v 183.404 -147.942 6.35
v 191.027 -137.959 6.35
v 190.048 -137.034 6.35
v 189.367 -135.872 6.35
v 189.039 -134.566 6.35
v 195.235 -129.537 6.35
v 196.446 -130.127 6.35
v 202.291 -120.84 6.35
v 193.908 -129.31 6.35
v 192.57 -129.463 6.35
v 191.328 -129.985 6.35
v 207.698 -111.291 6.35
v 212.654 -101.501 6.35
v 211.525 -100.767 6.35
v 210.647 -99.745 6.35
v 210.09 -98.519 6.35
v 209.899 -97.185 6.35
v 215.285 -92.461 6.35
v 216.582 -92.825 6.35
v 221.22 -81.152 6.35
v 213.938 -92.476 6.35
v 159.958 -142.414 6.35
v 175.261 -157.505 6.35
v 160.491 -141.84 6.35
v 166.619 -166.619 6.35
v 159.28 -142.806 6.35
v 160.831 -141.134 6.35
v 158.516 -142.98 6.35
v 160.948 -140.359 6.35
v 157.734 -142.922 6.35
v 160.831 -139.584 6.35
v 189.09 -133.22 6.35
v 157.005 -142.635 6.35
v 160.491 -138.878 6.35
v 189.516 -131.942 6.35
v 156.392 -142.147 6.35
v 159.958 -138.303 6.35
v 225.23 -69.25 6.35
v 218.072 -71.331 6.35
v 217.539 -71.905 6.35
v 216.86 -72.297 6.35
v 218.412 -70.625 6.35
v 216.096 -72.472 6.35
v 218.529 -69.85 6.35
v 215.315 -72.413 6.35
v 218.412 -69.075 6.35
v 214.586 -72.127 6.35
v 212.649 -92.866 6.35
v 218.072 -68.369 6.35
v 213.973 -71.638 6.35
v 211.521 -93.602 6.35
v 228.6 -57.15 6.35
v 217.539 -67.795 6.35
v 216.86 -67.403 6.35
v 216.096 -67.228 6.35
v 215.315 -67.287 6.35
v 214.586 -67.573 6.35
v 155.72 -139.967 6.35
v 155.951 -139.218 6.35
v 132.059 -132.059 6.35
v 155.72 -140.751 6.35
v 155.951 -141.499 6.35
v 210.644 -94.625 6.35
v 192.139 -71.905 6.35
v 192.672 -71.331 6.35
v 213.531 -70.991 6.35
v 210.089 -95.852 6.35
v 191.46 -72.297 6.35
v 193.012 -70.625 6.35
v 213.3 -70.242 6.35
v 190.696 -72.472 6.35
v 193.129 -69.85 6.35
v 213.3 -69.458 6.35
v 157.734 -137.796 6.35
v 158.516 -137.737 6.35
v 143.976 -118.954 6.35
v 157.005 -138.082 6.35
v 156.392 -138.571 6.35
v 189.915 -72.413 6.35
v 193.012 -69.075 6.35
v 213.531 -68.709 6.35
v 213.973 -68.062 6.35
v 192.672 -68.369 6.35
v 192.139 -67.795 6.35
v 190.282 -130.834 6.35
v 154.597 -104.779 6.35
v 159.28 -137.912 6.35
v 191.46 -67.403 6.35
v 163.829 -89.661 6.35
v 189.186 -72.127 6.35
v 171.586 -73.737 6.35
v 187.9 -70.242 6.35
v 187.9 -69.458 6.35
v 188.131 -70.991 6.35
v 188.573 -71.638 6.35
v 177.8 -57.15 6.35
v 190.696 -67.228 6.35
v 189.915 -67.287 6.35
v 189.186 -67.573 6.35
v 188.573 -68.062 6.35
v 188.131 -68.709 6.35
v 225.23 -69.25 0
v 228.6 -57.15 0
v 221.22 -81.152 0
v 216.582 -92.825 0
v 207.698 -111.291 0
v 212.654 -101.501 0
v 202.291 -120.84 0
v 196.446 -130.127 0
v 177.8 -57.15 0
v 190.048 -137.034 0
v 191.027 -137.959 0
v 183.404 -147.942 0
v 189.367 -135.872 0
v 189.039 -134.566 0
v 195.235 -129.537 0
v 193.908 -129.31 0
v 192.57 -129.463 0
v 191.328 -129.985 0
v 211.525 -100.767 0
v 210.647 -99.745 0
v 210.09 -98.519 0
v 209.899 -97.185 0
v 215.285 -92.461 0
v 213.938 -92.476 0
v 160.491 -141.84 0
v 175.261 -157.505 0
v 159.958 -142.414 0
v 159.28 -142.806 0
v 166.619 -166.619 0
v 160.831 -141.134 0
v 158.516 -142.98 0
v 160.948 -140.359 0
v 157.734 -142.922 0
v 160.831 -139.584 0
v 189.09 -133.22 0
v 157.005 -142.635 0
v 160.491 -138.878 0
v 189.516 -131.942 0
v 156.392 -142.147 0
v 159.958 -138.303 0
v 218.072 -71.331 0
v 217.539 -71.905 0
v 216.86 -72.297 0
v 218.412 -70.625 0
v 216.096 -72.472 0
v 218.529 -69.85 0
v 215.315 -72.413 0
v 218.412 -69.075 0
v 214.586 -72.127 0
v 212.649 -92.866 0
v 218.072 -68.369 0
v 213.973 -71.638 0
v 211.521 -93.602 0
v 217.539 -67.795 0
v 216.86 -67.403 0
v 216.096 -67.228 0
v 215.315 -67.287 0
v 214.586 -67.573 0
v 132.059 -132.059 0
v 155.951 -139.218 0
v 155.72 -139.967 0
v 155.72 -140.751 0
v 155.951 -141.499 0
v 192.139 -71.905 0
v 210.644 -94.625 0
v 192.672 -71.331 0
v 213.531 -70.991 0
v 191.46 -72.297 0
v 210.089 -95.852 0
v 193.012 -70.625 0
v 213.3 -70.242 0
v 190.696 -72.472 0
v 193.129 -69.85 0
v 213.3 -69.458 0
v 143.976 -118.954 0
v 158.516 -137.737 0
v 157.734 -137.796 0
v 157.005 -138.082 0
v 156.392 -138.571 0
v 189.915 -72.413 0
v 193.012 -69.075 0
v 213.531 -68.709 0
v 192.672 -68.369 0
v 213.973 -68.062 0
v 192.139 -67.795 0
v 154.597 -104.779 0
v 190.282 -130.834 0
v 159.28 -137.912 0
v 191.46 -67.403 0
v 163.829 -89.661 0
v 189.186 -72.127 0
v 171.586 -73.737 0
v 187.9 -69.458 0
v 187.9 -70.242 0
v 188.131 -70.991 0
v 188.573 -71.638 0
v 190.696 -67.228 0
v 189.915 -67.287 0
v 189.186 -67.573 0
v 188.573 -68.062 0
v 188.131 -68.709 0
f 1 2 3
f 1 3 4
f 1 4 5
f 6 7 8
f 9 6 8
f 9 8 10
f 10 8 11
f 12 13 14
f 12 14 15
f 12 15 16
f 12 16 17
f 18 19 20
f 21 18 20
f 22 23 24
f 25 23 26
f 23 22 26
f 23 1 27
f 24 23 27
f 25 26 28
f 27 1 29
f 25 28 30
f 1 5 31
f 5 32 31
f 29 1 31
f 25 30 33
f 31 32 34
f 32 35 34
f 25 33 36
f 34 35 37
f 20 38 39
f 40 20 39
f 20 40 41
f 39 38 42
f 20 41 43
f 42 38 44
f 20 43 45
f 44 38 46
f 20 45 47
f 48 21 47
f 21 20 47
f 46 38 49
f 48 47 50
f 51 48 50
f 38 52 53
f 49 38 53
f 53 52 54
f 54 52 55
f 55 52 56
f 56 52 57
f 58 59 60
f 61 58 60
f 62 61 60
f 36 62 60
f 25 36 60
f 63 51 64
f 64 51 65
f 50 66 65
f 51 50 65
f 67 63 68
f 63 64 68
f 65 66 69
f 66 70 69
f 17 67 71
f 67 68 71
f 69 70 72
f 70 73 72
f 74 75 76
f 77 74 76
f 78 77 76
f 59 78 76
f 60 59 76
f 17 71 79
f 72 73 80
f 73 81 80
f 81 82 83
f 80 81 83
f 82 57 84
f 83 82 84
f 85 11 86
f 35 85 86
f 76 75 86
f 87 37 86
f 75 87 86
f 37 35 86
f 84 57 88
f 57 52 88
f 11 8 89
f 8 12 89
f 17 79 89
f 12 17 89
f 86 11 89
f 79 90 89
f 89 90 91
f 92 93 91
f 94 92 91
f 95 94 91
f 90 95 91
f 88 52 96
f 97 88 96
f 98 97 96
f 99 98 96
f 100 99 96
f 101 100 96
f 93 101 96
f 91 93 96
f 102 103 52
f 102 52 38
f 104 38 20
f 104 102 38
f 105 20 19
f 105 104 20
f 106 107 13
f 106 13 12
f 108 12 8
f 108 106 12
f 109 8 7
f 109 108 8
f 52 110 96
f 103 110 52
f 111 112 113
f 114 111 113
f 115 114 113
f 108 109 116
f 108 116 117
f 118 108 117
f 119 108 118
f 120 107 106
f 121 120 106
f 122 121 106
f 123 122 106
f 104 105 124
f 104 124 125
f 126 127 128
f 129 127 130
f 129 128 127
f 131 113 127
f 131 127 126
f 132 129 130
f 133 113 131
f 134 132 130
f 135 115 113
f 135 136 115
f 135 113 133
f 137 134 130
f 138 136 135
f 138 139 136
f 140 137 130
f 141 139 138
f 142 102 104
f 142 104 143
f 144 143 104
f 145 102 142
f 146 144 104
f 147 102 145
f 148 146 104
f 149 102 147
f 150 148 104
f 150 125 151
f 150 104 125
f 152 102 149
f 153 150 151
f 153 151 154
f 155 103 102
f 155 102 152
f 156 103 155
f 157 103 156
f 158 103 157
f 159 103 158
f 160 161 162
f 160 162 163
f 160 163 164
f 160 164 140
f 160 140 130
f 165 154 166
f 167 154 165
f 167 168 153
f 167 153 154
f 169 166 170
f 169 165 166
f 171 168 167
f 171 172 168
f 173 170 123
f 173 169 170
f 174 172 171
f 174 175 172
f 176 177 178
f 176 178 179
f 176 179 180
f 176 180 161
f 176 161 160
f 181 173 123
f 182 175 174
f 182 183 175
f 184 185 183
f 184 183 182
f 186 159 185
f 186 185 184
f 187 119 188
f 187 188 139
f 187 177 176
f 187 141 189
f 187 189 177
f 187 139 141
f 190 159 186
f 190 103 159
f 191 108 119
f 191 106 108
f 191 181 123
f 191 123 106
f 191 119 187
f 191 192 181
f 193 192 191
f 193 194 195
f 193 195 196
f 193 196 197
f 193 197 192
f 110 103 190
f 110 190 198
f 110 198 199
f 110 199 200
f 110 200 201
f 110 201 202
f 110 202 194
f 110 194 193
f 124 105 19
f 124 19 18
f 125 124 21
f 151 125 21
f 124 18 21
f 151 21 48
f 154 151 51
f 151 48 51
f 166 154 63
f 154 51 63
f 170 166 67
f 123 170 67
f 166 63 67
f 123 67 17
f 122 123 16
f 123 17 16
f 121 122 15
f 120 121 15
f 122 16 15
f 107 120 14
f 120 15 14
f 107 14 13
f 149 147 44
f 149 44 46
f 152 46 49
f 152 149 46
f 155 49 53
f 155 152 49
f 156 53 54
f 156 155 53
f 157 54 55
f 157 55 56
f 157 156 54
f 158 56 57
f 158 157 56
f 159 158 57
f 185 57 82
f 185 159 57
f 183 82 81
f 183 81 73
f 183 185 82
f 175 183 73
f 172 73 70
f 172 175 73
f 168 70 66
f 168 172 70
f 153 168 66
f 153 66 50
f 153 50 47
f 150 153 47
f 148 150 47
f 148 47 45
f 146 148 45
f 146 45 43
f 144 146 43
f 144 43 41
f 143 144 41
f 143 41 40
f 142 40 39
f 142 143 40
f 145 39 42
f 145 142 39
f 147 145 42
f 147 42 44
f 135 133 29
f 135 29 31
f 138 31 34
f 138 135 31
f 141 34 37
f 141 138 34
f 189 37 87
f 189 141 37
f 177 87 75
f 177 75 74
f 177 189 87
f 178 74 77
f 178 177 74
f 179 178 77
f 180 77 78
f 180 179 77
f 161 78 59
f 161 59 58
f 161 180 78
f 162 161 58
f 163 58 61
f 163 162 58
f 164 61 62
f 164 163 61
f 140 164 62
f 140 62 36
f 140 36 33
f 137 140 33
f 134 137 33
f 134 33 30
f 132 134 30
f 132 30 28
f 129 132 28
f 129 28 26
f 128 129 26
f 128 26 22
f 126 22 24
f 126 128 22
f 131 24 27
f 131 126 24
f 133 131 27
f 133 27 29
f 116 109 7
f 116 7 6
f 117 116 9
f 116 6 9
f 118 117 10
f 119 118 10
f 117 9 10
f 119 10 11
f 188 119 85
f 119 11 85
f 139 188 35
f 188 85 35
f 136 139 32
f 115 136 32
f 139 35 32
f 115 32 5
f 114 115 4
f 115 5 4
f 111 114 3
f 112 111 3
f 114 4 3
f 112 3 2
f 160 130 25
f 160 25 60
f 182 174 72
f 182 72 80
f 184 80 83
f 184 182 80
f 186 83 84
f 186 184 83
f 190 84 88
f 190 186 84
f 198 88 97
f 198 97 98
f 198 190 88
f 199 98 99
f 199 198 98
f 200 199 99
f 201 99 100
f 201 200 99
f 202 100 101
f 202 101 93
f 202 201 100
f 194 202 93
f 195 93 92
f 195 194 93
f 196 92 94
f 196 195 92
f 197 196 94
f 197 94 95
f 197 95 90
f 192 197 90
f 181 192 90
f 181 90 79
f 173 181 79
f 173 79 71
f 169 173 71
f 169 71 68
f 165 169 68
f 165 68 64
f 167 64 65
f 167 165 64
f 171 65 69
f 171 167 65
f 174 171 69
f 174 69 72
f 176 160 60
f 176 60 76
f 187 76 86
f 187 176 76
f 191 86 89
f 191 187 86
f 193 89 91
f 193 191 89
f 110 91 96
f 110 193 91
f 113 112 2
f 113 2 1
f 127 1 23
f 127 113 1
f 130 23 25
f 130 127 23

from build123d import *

# Parameters (mm, degrees)
SKETCH1_R           = 2.6289
BOSS_EXTRUDE1_DEPTH = 6.35
SKETCH2_R           = 4.7625
CUT_EXTRUDE1_DEPTH  = 6.35


with BuildPart() as part:
    # Sketch1 → Boss-Extrude1 (new body)
    with BuildSketch(Plane.XY):
        with BuildLine():
            Line((177.8, -57.15), (228.6, -57.15))
            ThreePointArc((228.6, -57.15), (205.049978384, -116.097324969), (166.619450395, -166.619450395))
            Line((166.619450395, -166.619450395), (132.058628079, -132.058628079))
            ThreePointArc((132.058628079, -132.058628079), (159.392339806, -97.32956648), (177.8, -57.15))
        make_face()
        with Locations((190.5, -69.85)):
            Circle(SKETCH1_R, mode=Mode.SUBTRACT)
        with Locations((215.9, -69.85)):
            Circle(SKETCH1_R, mode=Mode.SUBTRACT)
        with Locations((158.319295358, -140.358783116)):
            Circle(SKETCH1_R, mode=Mode.SUBTRACT)
    extrude(amount=BOSS_EXTRUDE1_DEPTH)

    # Sketch2 → Cut-Extrude1 (cut)
    with BuildSketch(Plane.XY.offset(6.35)):
        with Locations((193.77605394, -134.07059118)):
            Circle(SKETCH2_R)
        with Locations((214.661540739, -97.182845336)):
            Circle(SKETCH2_R)
    extrude(amount=-CUT_EXTRUDE1_DEPTH, mode=Mode.SUBTRACT)


solid = part.part
